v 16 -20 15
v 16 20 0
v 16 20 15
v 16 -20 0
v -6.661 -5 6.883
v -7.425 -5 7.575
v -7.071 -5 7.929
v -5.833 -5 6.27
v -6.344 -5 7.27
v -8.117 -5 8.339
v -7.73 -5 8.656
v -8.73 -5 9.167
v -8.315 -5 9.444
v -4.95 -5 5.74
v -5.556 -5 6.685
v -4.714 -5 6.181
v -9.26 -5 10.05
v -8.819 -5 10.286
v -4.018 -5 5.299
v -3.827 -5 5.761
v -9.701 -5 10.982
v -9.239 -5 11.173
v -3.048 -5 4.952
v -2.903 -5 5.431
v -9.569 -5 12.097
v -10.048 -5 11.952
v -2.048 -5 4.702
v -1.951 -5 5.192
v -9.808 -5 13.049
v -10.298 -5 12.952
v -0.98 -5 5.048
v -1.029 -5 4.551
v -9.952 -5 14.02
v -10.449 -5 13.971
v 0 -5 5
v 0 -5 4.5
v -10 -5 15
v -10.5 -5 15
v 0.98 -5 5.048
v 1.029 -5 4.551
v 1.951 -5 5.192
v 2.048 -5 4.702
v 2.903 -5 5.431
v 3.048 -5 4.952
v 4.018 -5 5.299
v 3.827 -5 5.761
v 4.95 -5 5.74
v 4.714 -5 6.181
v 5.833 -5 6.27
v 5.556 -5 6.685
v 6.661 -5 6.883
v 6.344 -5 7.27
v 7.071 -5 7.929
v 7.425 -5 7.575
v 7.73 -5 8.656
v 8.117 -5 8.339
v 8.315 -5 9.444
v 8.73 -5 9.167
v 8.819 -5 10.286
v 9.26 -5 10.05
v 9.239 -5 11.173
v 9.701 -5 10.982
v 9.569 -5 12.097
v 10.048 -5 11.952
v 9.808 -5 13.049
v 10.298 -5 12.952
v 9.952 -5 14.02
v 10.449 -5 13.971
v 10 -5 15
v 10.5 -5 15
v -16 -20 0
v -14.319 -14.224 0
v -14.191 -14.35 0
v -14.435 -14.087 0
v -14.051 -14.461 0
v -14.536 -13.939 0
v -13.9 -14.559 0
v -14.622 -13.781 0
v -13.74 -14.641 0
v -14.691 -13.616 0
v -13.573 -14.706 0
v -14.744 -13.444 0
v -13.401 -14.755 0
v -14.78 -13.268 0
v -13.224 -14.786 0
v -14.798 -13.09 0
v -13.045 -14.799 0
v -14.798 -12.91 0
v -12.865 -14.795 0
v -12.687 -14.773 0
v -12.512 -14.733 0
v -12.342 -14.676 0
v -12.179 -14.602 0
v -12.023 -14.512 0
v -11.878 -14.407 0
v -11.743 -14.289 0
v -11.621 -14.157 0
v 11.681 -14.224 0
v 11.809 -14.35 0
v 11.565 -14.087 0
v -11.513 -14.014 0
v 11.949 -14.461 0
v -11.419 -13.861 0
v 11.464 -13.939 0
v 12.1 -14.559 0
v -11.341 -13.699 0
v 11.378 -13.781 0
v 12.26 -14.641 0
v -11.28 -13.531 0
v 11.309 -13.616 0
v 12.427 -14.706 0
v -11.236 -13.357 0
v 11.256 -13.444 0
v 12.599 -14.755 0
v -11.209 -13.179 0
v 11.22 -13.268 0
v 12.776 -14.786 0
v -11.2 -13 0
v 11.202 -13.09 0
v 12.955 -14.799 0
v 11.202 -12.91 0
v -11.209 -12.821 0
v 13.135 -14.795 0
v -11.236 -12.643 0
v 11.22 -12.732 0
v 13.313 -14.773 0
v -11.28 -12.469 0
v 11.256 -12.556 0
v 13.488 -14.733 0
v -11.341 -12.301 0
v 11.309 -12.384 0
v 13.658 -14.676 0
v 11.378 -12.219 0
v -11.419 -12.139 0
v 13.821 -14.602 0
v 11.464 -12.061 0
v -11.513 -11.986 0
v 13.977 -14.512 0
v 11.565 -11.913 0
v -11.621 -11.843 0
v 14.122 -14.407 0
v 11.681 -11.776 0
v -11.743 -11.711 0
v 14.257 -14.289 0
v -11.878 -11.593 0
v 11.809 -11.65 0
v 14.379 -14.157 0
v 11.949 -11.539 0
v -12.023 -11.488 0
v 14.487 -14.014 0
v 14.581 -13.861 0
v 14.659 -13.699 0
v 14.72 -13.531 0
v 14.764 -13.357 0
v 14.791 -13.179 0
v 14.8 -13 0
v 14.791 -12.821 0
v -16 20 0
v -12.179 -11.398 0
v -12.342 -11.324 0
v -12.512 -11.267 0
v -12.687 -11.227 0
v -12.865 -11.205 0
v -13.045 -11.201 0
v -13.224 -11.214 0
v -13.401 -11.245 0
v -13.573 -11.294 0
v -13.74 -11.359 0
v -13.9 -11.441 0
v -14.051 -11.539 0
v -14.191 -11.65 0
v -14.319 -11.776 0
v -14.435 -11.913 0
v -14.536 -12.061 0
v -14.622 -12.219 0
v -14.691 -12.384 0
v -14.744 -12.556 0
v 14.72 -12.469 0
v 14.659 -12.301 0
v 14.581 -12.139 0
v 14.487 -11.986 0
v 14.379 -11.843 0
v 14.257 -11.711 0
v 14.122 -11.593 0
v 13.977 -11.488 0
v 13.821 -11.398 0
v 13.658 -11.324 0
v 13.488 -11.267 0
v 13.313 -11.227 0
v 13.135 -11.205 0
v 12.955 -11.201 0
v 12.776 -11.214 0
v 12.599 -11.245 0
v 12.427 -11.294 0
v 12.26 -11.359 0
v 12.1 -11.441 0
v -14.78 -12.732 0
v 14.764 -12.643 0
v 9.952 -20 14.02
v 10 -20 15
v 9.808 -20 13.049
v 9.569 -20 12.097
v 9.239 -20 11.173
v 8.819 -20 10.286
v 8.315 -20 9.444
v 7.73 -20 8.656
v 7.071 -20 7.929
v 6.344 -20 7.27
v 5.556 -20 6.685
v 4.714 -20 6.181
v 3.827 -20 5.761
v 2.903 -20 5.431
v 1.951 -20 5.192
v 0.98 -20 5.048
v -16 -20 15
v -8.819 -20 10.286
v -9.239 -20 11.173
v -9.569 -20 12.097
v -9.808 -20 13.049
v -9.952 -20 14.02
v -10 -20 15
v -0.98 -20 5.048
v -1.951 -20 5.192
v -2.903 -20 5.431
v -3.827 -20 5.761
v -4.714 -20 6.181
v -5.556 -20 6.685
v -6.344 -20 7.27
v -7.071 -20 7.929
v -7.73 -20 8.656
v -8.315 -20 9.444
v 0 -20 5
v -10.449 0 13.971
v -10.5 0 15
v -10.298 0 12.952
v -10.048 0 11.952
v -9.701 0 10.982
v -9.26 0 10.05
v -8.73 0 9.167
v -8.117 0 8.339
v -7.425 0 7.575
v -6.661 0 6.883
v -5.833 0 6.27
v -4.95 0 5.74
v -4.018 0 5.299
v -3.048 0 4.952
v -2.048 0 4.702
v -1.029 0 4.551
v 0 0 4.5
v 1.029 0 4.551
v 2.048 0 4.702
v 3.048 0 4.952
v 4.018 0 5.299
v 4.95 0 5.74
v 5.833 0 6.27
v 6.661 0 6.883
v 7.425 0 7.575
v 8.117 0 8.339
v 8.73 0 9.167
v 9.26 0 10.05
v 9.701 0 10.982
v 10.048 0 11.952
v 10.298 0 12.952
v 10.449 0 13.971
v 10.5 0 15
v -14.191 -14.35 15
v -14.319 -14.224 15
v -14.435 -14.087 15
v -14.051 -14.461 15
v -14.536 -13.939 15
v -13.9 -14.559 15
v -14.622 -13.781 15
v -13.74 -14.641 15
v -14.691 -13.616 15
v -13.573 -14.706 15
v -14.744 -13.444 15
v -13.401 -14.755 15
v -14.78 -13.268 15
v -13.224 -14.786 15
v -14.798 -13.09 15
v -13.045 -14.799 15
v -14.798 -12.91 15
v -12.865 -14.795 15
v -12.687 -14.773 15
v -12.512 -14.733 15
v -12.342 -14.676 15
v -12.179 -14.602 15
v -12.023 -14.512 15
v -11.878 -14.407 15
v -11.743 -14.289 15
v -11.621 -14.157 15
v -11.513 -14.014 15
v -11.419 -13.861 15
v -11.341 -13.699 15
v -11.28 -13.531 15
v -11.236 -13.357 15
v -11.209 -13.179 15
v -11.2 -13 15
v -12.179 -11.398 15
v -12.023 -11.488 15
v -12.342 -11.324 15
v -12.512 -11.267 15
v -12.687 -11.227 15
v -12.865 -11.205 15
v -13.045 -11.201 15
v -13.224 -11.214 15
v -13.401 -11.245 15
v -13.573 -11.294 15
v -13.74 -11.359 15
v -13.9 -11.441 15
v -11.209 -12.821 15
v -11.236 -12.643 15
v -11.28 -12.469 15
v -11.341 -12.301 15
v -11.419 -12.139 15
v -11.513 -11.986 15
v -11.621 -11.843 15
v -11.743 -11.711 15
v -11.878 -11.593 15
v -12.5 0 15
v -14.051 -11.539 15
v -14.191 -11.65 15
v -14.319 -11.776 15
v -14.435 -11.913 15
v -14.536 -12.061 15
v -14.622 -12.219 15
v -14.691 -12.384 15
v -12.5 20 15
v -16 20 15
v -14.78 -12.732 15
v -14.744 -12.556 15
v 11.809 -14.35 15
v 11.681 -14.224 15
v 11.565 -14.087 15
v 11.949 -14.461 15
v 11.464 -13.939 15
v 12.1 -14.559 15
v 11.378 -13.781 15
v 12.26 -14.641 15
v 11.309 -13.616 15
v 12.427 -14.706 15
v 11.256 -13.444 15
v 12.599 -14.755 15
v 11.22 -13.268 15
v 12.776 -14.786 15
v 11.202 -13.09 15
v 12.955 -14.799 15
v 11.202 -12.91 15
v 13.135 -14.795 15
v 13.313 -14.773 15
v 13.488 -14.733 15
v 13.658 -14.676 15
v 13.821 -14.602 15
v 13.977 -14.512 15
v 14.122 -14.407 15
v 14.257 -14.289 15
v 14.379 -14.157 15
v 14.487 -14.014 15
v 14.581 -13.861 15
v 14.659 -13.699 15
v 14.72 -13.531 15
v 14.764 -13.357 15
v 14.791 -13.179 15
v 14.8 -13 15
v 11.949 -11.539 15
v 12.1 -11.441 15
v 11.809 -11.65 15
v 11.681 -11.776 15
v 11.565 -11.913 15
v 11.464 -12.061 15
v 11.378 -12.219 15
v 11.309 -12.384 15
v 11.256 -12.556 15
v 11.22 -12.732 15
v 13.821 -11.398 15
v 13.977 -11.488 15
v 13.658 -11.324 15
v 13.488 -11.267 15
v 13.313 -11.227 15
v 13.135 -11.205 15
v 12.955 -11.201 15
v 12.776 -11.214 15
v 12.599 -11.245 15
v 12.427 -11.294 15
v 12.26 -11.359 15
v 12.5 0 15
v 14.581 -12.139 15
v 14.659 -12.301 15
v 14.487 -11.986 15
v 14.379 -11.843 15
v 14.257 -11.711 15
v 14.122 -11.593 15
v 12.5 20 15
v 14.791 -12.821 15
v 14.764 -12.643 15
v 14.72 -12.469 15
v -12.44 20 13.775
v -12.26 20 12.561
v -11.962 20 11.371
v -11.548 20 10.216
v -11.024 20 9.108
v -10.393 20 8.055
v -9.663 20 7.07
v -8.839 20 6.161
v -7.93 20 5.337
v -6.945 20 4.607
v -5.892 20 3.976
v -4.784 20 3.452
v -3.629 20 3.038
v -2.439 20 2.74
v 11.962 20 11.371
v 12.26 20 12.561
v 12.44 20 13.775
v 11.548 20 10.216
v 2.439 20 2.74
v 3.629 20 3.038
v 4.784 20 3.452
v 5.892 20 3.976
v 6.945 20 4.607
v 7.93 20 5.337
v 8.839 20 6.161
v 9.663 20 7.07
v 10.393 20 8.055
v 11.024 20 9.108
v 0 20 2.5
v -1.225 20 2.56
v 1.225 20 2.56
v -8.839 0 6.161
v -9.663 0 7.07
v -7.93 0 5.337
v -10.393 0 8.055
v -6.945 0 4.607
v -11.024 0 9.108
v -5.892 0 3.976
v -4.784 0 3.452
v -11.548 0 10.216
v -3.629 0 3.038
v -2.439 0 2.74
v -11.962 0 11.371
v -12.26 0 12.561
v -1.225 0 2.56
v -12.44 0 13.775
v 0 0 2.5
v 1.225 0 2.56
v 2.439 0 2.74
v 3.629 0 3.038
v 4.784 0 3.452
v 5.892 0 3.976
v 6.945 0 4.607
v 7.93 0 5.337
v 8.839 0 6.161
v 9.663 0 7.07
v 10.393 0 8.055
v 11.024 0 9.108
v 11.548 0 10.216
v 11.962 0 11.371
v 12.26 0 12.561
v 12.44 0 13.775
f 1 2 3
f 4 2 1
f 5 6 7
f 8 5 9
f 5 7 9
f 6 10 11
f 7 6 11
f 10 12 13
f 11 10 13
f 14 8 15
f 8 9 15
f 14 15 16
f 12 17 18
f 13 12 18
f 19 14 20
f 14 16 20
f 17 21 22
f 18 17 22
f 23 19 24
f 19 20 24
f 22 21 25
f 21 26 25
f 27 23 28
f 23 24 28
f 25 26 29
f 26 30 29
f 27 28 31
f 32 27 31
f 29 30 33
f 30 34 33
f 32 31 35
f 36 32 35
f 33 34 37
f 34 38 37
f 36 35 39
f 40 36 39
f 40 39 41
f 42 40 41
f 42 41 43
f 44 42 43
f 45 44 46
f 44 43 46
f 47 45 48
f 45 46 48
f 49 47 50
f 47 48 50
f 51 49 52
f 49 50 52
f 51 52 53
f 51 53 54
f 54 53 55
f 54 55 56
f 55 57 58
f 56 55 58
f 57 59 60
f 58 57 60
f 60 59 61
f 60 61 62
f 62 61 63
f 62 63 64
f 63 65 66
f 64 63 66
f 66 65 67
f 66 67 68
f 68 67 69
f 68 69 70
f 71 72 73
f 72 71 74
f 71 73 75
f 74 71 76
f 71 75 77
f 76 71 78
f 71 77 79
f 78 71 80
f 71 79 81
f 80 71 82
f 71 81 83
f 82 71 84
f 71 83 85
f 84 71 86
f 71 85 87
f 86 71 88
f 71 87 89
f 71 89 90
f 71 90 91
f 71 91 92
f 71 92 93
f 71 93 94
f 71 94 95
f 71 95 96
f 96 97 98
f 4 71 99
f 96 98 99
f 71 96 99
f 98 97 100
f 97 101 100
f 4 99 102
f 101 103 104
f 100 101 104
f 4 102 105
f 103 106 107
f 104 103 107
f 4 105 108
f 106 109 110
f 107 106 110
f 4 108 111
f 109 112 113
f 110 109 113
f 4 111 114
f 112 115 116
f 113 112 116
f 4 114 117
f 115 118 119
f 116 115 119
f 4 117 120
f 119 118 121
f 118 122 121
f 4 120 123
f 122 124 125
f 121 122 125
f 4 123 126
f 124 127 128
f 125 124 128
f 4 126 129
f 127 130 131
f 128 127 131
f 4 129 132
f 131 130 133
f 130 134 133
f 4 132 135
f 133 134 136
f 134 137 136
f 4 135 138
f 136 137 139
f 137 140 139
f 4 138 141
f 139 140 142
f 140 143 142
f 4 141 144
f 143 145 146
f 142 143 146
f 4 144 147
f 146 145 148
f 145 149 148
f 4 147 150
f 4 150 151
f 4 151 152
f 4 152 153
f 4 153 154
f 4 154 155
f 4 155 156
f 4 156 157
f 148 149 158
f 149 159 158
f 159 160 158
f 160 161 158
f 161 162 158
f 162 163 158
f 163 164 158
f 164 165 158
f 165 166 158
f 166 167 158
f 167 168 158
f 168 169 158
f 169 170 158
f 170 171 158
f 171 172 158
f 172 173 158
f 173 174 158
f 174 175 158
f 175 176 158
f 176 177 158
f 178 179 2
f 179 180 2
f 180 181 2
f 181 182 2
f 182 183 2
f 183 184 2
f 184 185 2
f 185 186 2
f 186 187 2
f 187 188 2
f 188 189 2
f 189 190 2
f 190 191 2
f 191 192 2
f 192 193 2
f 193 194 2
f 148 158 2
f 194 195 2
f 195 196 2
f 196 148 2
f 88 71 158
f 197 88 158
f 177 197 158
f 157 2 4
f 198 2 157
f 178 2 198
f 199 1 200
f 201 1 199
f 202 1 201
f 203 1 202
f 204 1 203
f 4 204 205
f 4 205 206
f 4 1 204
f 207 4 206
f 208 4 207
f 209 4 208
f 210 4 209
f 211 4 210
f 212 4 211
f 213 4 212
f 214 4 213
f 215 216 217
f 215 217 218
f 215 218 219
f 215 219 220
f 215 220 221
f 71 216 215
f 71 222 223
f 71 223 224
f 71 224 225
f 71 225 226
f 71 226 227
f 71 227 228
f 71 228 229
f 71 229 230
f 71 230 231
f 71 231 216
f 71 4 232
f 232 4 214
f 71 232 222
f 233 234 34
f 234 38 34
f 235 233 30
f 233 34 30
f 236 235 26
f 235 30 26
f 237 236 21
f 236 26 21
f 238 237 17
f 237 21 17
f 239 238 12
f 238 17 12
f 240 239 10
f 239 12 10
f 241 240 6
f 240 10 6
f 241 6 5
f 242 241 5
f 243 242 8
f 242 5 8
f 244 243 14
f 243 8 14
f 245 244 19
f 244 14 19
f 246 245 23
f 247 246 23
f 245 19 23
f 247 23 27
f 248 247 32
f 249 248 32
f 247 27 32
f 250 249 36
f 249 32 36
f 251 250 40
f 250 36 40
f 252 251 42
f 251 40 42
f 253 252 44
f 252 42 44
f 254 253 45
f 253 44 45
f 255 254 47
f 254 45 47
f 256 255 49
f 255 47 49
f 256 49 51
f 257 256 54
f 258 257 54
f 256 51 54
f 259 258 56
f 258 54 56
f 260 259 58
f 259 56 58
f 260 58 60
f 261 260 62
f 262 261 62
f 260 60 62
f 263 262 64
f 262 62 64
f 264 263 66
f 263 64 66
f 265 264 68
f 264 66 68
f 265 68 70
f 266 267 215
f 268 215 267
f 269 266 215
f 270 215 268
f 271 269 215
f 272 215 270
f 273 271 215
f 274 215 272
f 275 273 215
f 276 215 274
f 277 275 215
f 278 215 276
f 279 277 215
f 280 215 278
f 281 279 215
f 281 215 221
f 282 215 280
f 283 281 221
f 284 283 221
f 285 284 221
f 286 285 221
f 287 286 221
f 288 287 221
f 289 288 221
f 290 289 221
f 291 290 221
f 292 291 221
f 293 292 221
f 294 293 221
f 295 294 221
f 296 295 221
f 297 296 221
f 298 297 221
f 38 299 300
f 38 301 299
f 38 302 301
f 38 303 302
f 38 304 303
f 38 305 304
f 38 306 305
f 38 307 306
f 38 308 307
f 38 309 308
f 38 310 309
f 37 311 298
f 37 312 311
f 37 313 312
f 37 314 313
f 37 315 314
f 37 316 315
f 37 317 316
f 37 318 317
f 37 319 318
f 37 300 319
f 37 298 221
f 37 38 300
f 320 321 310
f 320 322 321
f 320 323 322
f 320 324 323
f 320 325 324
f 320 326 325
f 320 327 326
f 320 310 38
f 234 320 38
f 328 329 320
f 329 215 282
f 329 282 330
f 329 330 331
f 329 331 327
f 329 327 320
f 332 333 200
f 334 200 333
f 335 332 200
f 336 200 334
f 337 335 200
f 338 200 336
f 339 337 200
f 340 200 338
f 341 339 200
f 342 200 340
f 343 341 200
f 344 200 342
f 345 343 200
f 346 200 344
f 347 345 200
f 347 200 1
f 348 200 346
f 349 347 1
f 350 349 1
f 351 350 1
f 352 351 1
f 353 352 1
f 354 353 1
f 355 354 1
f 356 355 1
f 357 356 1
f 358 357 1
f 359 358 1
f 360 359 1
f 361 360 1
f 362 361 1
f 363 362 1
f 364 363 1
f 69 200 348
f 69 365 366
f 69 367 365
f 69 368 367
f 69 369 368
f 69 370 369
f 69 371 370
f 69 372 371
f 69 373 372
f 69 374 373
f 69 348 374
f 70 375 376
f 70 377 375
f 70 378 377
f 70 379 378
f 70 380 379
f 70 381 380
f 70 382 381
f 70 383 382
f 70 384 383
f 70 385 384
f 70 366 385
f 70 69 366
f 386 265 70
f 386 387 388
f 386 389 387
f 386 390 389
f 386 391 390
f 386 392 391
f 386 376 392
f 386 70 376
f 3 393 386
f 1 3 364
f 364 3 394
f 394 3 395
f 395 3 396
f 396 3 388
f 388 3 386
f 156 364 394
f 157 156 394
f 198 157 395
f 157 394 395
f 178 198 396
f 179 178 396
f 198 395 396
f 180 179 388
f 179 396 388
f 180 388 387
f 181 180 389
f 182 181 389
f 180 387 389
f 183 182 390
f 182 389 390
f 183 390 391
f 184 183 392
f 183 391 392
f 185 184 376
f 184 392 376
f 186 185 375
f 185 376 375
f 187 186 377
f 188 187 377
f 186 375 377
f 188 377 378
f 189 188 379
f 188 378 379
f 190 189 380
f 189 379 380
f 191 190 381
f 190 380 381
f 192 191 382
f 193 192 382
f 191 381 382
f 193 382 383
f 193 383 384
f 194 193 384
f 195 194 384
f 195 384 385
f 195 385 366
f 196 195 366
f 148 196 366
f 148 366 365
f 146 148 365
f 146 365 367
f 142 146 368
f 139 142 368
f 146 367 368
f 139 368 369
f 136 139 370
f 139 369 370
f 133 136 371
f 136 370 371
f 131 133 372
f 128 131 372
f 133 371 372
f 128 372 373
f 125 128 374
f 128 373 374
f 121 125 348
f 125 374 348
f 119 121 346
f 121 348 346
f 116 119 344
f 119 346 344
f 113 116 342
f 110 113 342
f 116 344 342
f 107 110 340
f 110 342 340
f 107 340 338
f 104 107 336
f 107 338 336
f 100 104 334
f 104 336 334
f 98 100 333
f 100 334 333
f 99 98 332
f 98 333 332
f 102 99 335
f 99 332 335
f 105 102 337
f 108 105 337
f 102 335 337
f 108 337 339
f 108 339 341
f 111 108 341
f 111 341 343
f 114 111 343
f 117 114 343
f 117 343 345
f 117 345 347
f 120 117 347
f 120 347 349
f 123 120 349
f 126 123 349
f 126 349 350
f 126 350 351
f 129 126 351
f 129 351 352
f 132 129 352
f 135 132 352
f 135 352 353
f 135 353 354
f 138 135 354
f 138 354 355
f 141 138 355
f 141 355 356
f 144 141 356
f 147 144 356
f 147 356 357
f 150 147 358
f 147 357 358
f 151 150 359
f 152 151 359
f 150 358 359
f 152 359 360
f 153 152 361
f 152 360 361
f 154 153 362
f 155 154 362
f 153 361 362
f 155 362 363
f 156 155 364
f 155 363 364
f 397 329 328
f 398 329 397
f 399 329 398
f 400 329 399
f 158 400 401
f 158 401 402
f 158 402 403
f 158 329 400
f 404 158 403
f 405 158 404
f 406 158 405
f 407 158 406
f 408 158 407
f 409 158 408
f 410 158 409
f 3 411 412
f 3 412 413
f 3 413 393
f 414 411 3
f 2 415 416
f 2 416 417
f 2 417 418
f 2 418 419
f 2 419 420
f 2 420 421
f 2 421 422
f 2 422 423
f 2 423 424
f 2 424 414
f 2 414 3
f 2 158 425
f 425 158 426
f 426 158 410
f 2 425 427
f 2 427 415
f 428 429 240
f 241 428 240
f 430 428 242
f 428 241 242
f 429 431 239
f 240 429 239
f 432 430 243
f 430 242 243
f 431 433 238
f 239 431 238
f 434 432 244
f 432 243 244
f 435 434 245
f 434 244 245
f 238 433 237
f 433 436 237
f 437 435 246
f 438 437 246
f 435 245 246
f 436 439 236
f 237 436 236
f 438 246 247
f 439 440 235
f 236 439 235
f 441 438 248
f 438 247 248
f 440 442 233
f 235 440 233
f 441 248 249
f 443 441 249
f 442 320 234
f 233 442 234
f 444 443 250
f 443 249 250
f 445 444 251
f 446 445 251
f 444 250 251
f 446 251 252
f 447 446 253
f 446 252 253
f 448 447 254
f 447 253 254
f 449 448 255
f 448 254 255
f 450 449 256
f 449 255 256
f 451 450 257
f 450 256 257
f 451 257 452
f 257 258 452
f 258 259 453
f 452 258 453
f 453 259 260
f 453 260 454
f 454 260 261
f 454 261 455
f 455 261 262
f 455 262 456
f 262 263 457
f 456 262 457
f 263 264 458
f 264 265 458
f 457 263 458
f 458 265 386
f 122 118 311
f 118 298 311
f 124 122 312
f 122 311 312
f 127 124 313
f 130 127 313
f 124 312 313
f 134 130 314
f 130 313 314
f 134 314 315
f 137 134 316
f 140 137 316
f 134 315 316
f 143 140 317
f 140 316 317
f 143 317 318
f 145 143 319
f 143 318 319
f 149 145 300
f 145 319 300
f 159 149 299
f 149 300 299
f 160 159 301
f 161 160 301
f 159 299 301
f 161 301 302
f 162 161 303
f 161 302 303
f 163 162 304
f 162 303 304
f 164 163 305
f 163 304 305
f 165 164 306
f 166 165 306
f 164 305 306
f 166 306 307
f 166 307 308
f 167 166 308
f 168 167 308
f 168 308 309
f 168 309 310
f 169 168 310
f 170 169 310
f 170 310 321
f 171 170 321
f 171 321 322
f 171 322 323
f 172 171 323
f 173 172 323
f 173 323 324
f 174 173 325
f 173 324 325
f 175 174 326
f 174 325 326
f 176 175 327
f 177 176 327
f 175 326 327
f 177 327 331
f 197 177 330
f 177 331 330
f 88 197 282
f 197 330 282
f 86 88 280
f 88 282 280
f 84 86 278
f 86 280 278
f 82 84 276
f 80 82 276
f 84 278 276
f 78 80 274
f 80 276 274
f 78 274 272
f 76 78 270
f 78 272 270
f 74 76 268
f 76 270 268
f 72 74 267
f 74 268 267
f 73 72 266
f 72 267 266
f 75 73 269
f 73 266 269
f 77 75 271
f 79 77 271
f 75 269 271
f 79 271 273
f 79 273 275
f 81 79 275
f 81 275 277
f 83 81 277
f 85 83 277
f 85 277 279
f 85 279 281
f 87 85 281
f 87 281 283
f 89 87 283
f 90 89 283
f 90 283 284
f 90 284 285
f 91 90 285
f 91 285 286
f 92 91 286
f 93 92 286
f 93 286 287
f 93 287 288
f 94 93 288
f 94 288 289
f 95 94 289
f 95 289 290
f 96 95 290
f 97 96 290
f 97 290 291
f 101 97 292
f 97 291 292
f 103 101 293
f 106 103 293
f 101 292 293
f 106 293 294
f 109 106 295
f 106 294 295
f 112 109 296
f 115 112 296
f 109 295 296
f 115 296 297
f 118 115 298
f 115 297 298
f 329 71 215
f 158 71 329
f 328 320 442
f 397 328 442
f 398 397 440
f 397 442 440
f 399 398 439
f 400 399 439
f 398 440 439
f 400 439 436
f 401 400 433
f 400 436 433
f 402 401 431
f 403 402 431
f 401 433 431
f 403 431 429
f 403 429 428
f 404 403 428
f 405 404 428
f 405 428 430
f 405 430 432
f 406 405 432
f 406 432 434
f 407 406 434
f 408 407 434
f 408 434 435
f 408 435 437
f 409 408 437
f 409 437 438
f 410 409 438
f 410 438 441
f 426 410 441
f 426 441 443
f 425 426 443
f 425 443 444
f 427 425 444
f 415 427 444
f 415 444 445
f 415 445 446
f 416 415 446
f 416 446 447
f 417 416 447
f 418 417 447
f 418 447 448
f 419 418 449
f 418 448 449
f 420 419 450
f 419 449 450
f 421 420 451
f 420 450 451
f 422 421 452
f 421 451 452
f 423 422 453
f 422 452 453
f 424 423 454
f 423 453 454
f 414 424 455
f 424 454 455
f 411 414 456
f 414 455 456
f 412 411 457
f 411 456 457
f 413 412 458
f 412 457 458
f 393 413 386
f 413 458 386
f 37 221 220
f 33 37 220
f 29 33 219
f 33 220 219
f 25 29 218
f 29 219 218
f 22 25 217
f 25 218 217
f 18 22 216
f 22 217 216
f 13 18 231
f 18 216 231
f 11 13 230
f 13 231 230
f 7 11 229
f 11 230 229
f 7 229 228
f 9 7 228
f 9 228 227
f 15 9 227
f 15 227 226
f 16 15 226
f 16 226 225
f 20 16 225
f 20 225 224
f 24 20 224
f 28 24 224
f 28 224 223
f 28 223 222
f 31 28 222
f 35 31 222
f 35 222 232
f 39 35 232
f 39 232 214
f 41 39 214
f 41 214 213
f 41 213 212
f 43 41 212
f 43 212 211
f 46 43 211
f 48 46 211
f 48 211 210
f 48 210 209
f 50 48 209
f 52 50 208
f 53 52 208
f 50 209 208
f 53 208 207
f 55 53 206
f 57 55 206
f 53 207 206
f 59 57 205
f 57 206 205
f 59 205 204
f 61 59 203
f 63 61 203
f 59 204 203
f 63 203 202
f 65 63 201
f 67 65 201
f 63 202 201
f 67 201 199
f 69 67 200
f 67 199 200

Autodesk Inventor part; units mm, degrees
ref_plane "YZ Plane" through (0, 0, 0) normal (1, 0, 0) x (0, 1, 0)
ref_plane "XZ Plane" through (0, 0, 0) normal (0, 1, 0) x (-1, 0, 0)
ref_plane "XY Plane" through (0, 0, 0) normal (0, 0, 1) x (1, 0, 0)
sketch "Skizze1" plane through (0, 0, 0) normal (0, 0, 1) x (1, 0, 0)
  line L0 (-16, 20) -> (16, 20)
  line L1 (16, 20) -> (16, -20)
  line L2 (16, -20) -> (-16, -20)
  line L3 (-16, -20) -> (-16, 20)
  line L4 (-16, 20) -> (16, -20) construction
  line L5 (16, 20) -> (-16, -20) construction
  point P0 (0, 0)
  dimension "d0" = 32
  dimension "d1" = 40
extrude "Extrusion1" add sketch "Skizze1" along normal blind 15
sketch "Skizze2" plane through (-16, -20, 0) normal (0, -1, 0) x (1, 0, 0)
  line L0 (0, 15) -> (32, 15) projected
  line L1 (0, 0) -> (0, 15) projected
  line L2 (32, 0) -> (0, 0) projected
  line L3 (32, 0) -> (32, 15) projected
  line L4 (32, 15) -> (0, 15) projected
  circle A0 centre (16, 15) radius 10
  point P0 (16, 0)
  dimension "d4" = 20
extrude "Extrusion2" cut sketch "Skizze2" against normal blind 15 contours A0 L0 | L0 A0
sketch "Skizze3" plane through (-16, -5, 0) normal (0, -1, 0) x (1, 0, 0)
  line L0 (0, 0) -> (0, 15) projected
  line L1 (32, 0) -> (0, 0) projected
  line L2 (32, 0) -> (32, 15) projected
  line L3 (26, 15) -> (32, 15) projected
  line L4 (0, 15) -> (6, 15) projected
  line L5 (6, 15) -> (26, 15) projected
  circle A0 centre (16, 15) radius 10.5
  point P0 (16, 0)
  dimension "d7" = 21
extrude "Extrusion3" cut sketch "Skizze3" against normal blind 5 contours A0 L3 L5 L4 | L4 L5 L3 A0
sketch "Skizze4" plane through (-16, 0, 0) normal (0, -1, 0) x (1, 0, 0)
  line L0 (5.5, 15) -> (26.5, 15) projected
  circle A0 centre (16, 15) radius 12.5
  point P0 (16, 0)
  dimension "d10" = 25
extrude "Extrusion4" cut sketch "Skizze4" against normal through all
sketch "Skizze5" plane through (0, 0, 15) normal (0, 0, 1) x (1, 0, 0)
  line L0 (-16, 20) -> (-16, -20) projected
  line L1 (-16, -20) -> (-10, -20) projected
  line L2 (-10, -20) -> (-10, -5) projected
  line L3 (10, -5) -> (10, -20) projected
  line L4 (10, -20) -> (16, -20) projected
  line L5 (16, -20) -> (16, 20) projected
  circle A0 centre (-13, -13) radius 1.8
  circle A1 centre (13, -13) radius 1.8
  point P0 (0, 0)
  dimension "d13" = 3.6
  dimension "d14" = 3.6
  dimension "d15" = 7
  dimension "d16" = 7
  dimension "d17" = 3
  dimension "d18" = 3
extrude "Extrusion5" cut sketch "Skizze5" against normal through all
